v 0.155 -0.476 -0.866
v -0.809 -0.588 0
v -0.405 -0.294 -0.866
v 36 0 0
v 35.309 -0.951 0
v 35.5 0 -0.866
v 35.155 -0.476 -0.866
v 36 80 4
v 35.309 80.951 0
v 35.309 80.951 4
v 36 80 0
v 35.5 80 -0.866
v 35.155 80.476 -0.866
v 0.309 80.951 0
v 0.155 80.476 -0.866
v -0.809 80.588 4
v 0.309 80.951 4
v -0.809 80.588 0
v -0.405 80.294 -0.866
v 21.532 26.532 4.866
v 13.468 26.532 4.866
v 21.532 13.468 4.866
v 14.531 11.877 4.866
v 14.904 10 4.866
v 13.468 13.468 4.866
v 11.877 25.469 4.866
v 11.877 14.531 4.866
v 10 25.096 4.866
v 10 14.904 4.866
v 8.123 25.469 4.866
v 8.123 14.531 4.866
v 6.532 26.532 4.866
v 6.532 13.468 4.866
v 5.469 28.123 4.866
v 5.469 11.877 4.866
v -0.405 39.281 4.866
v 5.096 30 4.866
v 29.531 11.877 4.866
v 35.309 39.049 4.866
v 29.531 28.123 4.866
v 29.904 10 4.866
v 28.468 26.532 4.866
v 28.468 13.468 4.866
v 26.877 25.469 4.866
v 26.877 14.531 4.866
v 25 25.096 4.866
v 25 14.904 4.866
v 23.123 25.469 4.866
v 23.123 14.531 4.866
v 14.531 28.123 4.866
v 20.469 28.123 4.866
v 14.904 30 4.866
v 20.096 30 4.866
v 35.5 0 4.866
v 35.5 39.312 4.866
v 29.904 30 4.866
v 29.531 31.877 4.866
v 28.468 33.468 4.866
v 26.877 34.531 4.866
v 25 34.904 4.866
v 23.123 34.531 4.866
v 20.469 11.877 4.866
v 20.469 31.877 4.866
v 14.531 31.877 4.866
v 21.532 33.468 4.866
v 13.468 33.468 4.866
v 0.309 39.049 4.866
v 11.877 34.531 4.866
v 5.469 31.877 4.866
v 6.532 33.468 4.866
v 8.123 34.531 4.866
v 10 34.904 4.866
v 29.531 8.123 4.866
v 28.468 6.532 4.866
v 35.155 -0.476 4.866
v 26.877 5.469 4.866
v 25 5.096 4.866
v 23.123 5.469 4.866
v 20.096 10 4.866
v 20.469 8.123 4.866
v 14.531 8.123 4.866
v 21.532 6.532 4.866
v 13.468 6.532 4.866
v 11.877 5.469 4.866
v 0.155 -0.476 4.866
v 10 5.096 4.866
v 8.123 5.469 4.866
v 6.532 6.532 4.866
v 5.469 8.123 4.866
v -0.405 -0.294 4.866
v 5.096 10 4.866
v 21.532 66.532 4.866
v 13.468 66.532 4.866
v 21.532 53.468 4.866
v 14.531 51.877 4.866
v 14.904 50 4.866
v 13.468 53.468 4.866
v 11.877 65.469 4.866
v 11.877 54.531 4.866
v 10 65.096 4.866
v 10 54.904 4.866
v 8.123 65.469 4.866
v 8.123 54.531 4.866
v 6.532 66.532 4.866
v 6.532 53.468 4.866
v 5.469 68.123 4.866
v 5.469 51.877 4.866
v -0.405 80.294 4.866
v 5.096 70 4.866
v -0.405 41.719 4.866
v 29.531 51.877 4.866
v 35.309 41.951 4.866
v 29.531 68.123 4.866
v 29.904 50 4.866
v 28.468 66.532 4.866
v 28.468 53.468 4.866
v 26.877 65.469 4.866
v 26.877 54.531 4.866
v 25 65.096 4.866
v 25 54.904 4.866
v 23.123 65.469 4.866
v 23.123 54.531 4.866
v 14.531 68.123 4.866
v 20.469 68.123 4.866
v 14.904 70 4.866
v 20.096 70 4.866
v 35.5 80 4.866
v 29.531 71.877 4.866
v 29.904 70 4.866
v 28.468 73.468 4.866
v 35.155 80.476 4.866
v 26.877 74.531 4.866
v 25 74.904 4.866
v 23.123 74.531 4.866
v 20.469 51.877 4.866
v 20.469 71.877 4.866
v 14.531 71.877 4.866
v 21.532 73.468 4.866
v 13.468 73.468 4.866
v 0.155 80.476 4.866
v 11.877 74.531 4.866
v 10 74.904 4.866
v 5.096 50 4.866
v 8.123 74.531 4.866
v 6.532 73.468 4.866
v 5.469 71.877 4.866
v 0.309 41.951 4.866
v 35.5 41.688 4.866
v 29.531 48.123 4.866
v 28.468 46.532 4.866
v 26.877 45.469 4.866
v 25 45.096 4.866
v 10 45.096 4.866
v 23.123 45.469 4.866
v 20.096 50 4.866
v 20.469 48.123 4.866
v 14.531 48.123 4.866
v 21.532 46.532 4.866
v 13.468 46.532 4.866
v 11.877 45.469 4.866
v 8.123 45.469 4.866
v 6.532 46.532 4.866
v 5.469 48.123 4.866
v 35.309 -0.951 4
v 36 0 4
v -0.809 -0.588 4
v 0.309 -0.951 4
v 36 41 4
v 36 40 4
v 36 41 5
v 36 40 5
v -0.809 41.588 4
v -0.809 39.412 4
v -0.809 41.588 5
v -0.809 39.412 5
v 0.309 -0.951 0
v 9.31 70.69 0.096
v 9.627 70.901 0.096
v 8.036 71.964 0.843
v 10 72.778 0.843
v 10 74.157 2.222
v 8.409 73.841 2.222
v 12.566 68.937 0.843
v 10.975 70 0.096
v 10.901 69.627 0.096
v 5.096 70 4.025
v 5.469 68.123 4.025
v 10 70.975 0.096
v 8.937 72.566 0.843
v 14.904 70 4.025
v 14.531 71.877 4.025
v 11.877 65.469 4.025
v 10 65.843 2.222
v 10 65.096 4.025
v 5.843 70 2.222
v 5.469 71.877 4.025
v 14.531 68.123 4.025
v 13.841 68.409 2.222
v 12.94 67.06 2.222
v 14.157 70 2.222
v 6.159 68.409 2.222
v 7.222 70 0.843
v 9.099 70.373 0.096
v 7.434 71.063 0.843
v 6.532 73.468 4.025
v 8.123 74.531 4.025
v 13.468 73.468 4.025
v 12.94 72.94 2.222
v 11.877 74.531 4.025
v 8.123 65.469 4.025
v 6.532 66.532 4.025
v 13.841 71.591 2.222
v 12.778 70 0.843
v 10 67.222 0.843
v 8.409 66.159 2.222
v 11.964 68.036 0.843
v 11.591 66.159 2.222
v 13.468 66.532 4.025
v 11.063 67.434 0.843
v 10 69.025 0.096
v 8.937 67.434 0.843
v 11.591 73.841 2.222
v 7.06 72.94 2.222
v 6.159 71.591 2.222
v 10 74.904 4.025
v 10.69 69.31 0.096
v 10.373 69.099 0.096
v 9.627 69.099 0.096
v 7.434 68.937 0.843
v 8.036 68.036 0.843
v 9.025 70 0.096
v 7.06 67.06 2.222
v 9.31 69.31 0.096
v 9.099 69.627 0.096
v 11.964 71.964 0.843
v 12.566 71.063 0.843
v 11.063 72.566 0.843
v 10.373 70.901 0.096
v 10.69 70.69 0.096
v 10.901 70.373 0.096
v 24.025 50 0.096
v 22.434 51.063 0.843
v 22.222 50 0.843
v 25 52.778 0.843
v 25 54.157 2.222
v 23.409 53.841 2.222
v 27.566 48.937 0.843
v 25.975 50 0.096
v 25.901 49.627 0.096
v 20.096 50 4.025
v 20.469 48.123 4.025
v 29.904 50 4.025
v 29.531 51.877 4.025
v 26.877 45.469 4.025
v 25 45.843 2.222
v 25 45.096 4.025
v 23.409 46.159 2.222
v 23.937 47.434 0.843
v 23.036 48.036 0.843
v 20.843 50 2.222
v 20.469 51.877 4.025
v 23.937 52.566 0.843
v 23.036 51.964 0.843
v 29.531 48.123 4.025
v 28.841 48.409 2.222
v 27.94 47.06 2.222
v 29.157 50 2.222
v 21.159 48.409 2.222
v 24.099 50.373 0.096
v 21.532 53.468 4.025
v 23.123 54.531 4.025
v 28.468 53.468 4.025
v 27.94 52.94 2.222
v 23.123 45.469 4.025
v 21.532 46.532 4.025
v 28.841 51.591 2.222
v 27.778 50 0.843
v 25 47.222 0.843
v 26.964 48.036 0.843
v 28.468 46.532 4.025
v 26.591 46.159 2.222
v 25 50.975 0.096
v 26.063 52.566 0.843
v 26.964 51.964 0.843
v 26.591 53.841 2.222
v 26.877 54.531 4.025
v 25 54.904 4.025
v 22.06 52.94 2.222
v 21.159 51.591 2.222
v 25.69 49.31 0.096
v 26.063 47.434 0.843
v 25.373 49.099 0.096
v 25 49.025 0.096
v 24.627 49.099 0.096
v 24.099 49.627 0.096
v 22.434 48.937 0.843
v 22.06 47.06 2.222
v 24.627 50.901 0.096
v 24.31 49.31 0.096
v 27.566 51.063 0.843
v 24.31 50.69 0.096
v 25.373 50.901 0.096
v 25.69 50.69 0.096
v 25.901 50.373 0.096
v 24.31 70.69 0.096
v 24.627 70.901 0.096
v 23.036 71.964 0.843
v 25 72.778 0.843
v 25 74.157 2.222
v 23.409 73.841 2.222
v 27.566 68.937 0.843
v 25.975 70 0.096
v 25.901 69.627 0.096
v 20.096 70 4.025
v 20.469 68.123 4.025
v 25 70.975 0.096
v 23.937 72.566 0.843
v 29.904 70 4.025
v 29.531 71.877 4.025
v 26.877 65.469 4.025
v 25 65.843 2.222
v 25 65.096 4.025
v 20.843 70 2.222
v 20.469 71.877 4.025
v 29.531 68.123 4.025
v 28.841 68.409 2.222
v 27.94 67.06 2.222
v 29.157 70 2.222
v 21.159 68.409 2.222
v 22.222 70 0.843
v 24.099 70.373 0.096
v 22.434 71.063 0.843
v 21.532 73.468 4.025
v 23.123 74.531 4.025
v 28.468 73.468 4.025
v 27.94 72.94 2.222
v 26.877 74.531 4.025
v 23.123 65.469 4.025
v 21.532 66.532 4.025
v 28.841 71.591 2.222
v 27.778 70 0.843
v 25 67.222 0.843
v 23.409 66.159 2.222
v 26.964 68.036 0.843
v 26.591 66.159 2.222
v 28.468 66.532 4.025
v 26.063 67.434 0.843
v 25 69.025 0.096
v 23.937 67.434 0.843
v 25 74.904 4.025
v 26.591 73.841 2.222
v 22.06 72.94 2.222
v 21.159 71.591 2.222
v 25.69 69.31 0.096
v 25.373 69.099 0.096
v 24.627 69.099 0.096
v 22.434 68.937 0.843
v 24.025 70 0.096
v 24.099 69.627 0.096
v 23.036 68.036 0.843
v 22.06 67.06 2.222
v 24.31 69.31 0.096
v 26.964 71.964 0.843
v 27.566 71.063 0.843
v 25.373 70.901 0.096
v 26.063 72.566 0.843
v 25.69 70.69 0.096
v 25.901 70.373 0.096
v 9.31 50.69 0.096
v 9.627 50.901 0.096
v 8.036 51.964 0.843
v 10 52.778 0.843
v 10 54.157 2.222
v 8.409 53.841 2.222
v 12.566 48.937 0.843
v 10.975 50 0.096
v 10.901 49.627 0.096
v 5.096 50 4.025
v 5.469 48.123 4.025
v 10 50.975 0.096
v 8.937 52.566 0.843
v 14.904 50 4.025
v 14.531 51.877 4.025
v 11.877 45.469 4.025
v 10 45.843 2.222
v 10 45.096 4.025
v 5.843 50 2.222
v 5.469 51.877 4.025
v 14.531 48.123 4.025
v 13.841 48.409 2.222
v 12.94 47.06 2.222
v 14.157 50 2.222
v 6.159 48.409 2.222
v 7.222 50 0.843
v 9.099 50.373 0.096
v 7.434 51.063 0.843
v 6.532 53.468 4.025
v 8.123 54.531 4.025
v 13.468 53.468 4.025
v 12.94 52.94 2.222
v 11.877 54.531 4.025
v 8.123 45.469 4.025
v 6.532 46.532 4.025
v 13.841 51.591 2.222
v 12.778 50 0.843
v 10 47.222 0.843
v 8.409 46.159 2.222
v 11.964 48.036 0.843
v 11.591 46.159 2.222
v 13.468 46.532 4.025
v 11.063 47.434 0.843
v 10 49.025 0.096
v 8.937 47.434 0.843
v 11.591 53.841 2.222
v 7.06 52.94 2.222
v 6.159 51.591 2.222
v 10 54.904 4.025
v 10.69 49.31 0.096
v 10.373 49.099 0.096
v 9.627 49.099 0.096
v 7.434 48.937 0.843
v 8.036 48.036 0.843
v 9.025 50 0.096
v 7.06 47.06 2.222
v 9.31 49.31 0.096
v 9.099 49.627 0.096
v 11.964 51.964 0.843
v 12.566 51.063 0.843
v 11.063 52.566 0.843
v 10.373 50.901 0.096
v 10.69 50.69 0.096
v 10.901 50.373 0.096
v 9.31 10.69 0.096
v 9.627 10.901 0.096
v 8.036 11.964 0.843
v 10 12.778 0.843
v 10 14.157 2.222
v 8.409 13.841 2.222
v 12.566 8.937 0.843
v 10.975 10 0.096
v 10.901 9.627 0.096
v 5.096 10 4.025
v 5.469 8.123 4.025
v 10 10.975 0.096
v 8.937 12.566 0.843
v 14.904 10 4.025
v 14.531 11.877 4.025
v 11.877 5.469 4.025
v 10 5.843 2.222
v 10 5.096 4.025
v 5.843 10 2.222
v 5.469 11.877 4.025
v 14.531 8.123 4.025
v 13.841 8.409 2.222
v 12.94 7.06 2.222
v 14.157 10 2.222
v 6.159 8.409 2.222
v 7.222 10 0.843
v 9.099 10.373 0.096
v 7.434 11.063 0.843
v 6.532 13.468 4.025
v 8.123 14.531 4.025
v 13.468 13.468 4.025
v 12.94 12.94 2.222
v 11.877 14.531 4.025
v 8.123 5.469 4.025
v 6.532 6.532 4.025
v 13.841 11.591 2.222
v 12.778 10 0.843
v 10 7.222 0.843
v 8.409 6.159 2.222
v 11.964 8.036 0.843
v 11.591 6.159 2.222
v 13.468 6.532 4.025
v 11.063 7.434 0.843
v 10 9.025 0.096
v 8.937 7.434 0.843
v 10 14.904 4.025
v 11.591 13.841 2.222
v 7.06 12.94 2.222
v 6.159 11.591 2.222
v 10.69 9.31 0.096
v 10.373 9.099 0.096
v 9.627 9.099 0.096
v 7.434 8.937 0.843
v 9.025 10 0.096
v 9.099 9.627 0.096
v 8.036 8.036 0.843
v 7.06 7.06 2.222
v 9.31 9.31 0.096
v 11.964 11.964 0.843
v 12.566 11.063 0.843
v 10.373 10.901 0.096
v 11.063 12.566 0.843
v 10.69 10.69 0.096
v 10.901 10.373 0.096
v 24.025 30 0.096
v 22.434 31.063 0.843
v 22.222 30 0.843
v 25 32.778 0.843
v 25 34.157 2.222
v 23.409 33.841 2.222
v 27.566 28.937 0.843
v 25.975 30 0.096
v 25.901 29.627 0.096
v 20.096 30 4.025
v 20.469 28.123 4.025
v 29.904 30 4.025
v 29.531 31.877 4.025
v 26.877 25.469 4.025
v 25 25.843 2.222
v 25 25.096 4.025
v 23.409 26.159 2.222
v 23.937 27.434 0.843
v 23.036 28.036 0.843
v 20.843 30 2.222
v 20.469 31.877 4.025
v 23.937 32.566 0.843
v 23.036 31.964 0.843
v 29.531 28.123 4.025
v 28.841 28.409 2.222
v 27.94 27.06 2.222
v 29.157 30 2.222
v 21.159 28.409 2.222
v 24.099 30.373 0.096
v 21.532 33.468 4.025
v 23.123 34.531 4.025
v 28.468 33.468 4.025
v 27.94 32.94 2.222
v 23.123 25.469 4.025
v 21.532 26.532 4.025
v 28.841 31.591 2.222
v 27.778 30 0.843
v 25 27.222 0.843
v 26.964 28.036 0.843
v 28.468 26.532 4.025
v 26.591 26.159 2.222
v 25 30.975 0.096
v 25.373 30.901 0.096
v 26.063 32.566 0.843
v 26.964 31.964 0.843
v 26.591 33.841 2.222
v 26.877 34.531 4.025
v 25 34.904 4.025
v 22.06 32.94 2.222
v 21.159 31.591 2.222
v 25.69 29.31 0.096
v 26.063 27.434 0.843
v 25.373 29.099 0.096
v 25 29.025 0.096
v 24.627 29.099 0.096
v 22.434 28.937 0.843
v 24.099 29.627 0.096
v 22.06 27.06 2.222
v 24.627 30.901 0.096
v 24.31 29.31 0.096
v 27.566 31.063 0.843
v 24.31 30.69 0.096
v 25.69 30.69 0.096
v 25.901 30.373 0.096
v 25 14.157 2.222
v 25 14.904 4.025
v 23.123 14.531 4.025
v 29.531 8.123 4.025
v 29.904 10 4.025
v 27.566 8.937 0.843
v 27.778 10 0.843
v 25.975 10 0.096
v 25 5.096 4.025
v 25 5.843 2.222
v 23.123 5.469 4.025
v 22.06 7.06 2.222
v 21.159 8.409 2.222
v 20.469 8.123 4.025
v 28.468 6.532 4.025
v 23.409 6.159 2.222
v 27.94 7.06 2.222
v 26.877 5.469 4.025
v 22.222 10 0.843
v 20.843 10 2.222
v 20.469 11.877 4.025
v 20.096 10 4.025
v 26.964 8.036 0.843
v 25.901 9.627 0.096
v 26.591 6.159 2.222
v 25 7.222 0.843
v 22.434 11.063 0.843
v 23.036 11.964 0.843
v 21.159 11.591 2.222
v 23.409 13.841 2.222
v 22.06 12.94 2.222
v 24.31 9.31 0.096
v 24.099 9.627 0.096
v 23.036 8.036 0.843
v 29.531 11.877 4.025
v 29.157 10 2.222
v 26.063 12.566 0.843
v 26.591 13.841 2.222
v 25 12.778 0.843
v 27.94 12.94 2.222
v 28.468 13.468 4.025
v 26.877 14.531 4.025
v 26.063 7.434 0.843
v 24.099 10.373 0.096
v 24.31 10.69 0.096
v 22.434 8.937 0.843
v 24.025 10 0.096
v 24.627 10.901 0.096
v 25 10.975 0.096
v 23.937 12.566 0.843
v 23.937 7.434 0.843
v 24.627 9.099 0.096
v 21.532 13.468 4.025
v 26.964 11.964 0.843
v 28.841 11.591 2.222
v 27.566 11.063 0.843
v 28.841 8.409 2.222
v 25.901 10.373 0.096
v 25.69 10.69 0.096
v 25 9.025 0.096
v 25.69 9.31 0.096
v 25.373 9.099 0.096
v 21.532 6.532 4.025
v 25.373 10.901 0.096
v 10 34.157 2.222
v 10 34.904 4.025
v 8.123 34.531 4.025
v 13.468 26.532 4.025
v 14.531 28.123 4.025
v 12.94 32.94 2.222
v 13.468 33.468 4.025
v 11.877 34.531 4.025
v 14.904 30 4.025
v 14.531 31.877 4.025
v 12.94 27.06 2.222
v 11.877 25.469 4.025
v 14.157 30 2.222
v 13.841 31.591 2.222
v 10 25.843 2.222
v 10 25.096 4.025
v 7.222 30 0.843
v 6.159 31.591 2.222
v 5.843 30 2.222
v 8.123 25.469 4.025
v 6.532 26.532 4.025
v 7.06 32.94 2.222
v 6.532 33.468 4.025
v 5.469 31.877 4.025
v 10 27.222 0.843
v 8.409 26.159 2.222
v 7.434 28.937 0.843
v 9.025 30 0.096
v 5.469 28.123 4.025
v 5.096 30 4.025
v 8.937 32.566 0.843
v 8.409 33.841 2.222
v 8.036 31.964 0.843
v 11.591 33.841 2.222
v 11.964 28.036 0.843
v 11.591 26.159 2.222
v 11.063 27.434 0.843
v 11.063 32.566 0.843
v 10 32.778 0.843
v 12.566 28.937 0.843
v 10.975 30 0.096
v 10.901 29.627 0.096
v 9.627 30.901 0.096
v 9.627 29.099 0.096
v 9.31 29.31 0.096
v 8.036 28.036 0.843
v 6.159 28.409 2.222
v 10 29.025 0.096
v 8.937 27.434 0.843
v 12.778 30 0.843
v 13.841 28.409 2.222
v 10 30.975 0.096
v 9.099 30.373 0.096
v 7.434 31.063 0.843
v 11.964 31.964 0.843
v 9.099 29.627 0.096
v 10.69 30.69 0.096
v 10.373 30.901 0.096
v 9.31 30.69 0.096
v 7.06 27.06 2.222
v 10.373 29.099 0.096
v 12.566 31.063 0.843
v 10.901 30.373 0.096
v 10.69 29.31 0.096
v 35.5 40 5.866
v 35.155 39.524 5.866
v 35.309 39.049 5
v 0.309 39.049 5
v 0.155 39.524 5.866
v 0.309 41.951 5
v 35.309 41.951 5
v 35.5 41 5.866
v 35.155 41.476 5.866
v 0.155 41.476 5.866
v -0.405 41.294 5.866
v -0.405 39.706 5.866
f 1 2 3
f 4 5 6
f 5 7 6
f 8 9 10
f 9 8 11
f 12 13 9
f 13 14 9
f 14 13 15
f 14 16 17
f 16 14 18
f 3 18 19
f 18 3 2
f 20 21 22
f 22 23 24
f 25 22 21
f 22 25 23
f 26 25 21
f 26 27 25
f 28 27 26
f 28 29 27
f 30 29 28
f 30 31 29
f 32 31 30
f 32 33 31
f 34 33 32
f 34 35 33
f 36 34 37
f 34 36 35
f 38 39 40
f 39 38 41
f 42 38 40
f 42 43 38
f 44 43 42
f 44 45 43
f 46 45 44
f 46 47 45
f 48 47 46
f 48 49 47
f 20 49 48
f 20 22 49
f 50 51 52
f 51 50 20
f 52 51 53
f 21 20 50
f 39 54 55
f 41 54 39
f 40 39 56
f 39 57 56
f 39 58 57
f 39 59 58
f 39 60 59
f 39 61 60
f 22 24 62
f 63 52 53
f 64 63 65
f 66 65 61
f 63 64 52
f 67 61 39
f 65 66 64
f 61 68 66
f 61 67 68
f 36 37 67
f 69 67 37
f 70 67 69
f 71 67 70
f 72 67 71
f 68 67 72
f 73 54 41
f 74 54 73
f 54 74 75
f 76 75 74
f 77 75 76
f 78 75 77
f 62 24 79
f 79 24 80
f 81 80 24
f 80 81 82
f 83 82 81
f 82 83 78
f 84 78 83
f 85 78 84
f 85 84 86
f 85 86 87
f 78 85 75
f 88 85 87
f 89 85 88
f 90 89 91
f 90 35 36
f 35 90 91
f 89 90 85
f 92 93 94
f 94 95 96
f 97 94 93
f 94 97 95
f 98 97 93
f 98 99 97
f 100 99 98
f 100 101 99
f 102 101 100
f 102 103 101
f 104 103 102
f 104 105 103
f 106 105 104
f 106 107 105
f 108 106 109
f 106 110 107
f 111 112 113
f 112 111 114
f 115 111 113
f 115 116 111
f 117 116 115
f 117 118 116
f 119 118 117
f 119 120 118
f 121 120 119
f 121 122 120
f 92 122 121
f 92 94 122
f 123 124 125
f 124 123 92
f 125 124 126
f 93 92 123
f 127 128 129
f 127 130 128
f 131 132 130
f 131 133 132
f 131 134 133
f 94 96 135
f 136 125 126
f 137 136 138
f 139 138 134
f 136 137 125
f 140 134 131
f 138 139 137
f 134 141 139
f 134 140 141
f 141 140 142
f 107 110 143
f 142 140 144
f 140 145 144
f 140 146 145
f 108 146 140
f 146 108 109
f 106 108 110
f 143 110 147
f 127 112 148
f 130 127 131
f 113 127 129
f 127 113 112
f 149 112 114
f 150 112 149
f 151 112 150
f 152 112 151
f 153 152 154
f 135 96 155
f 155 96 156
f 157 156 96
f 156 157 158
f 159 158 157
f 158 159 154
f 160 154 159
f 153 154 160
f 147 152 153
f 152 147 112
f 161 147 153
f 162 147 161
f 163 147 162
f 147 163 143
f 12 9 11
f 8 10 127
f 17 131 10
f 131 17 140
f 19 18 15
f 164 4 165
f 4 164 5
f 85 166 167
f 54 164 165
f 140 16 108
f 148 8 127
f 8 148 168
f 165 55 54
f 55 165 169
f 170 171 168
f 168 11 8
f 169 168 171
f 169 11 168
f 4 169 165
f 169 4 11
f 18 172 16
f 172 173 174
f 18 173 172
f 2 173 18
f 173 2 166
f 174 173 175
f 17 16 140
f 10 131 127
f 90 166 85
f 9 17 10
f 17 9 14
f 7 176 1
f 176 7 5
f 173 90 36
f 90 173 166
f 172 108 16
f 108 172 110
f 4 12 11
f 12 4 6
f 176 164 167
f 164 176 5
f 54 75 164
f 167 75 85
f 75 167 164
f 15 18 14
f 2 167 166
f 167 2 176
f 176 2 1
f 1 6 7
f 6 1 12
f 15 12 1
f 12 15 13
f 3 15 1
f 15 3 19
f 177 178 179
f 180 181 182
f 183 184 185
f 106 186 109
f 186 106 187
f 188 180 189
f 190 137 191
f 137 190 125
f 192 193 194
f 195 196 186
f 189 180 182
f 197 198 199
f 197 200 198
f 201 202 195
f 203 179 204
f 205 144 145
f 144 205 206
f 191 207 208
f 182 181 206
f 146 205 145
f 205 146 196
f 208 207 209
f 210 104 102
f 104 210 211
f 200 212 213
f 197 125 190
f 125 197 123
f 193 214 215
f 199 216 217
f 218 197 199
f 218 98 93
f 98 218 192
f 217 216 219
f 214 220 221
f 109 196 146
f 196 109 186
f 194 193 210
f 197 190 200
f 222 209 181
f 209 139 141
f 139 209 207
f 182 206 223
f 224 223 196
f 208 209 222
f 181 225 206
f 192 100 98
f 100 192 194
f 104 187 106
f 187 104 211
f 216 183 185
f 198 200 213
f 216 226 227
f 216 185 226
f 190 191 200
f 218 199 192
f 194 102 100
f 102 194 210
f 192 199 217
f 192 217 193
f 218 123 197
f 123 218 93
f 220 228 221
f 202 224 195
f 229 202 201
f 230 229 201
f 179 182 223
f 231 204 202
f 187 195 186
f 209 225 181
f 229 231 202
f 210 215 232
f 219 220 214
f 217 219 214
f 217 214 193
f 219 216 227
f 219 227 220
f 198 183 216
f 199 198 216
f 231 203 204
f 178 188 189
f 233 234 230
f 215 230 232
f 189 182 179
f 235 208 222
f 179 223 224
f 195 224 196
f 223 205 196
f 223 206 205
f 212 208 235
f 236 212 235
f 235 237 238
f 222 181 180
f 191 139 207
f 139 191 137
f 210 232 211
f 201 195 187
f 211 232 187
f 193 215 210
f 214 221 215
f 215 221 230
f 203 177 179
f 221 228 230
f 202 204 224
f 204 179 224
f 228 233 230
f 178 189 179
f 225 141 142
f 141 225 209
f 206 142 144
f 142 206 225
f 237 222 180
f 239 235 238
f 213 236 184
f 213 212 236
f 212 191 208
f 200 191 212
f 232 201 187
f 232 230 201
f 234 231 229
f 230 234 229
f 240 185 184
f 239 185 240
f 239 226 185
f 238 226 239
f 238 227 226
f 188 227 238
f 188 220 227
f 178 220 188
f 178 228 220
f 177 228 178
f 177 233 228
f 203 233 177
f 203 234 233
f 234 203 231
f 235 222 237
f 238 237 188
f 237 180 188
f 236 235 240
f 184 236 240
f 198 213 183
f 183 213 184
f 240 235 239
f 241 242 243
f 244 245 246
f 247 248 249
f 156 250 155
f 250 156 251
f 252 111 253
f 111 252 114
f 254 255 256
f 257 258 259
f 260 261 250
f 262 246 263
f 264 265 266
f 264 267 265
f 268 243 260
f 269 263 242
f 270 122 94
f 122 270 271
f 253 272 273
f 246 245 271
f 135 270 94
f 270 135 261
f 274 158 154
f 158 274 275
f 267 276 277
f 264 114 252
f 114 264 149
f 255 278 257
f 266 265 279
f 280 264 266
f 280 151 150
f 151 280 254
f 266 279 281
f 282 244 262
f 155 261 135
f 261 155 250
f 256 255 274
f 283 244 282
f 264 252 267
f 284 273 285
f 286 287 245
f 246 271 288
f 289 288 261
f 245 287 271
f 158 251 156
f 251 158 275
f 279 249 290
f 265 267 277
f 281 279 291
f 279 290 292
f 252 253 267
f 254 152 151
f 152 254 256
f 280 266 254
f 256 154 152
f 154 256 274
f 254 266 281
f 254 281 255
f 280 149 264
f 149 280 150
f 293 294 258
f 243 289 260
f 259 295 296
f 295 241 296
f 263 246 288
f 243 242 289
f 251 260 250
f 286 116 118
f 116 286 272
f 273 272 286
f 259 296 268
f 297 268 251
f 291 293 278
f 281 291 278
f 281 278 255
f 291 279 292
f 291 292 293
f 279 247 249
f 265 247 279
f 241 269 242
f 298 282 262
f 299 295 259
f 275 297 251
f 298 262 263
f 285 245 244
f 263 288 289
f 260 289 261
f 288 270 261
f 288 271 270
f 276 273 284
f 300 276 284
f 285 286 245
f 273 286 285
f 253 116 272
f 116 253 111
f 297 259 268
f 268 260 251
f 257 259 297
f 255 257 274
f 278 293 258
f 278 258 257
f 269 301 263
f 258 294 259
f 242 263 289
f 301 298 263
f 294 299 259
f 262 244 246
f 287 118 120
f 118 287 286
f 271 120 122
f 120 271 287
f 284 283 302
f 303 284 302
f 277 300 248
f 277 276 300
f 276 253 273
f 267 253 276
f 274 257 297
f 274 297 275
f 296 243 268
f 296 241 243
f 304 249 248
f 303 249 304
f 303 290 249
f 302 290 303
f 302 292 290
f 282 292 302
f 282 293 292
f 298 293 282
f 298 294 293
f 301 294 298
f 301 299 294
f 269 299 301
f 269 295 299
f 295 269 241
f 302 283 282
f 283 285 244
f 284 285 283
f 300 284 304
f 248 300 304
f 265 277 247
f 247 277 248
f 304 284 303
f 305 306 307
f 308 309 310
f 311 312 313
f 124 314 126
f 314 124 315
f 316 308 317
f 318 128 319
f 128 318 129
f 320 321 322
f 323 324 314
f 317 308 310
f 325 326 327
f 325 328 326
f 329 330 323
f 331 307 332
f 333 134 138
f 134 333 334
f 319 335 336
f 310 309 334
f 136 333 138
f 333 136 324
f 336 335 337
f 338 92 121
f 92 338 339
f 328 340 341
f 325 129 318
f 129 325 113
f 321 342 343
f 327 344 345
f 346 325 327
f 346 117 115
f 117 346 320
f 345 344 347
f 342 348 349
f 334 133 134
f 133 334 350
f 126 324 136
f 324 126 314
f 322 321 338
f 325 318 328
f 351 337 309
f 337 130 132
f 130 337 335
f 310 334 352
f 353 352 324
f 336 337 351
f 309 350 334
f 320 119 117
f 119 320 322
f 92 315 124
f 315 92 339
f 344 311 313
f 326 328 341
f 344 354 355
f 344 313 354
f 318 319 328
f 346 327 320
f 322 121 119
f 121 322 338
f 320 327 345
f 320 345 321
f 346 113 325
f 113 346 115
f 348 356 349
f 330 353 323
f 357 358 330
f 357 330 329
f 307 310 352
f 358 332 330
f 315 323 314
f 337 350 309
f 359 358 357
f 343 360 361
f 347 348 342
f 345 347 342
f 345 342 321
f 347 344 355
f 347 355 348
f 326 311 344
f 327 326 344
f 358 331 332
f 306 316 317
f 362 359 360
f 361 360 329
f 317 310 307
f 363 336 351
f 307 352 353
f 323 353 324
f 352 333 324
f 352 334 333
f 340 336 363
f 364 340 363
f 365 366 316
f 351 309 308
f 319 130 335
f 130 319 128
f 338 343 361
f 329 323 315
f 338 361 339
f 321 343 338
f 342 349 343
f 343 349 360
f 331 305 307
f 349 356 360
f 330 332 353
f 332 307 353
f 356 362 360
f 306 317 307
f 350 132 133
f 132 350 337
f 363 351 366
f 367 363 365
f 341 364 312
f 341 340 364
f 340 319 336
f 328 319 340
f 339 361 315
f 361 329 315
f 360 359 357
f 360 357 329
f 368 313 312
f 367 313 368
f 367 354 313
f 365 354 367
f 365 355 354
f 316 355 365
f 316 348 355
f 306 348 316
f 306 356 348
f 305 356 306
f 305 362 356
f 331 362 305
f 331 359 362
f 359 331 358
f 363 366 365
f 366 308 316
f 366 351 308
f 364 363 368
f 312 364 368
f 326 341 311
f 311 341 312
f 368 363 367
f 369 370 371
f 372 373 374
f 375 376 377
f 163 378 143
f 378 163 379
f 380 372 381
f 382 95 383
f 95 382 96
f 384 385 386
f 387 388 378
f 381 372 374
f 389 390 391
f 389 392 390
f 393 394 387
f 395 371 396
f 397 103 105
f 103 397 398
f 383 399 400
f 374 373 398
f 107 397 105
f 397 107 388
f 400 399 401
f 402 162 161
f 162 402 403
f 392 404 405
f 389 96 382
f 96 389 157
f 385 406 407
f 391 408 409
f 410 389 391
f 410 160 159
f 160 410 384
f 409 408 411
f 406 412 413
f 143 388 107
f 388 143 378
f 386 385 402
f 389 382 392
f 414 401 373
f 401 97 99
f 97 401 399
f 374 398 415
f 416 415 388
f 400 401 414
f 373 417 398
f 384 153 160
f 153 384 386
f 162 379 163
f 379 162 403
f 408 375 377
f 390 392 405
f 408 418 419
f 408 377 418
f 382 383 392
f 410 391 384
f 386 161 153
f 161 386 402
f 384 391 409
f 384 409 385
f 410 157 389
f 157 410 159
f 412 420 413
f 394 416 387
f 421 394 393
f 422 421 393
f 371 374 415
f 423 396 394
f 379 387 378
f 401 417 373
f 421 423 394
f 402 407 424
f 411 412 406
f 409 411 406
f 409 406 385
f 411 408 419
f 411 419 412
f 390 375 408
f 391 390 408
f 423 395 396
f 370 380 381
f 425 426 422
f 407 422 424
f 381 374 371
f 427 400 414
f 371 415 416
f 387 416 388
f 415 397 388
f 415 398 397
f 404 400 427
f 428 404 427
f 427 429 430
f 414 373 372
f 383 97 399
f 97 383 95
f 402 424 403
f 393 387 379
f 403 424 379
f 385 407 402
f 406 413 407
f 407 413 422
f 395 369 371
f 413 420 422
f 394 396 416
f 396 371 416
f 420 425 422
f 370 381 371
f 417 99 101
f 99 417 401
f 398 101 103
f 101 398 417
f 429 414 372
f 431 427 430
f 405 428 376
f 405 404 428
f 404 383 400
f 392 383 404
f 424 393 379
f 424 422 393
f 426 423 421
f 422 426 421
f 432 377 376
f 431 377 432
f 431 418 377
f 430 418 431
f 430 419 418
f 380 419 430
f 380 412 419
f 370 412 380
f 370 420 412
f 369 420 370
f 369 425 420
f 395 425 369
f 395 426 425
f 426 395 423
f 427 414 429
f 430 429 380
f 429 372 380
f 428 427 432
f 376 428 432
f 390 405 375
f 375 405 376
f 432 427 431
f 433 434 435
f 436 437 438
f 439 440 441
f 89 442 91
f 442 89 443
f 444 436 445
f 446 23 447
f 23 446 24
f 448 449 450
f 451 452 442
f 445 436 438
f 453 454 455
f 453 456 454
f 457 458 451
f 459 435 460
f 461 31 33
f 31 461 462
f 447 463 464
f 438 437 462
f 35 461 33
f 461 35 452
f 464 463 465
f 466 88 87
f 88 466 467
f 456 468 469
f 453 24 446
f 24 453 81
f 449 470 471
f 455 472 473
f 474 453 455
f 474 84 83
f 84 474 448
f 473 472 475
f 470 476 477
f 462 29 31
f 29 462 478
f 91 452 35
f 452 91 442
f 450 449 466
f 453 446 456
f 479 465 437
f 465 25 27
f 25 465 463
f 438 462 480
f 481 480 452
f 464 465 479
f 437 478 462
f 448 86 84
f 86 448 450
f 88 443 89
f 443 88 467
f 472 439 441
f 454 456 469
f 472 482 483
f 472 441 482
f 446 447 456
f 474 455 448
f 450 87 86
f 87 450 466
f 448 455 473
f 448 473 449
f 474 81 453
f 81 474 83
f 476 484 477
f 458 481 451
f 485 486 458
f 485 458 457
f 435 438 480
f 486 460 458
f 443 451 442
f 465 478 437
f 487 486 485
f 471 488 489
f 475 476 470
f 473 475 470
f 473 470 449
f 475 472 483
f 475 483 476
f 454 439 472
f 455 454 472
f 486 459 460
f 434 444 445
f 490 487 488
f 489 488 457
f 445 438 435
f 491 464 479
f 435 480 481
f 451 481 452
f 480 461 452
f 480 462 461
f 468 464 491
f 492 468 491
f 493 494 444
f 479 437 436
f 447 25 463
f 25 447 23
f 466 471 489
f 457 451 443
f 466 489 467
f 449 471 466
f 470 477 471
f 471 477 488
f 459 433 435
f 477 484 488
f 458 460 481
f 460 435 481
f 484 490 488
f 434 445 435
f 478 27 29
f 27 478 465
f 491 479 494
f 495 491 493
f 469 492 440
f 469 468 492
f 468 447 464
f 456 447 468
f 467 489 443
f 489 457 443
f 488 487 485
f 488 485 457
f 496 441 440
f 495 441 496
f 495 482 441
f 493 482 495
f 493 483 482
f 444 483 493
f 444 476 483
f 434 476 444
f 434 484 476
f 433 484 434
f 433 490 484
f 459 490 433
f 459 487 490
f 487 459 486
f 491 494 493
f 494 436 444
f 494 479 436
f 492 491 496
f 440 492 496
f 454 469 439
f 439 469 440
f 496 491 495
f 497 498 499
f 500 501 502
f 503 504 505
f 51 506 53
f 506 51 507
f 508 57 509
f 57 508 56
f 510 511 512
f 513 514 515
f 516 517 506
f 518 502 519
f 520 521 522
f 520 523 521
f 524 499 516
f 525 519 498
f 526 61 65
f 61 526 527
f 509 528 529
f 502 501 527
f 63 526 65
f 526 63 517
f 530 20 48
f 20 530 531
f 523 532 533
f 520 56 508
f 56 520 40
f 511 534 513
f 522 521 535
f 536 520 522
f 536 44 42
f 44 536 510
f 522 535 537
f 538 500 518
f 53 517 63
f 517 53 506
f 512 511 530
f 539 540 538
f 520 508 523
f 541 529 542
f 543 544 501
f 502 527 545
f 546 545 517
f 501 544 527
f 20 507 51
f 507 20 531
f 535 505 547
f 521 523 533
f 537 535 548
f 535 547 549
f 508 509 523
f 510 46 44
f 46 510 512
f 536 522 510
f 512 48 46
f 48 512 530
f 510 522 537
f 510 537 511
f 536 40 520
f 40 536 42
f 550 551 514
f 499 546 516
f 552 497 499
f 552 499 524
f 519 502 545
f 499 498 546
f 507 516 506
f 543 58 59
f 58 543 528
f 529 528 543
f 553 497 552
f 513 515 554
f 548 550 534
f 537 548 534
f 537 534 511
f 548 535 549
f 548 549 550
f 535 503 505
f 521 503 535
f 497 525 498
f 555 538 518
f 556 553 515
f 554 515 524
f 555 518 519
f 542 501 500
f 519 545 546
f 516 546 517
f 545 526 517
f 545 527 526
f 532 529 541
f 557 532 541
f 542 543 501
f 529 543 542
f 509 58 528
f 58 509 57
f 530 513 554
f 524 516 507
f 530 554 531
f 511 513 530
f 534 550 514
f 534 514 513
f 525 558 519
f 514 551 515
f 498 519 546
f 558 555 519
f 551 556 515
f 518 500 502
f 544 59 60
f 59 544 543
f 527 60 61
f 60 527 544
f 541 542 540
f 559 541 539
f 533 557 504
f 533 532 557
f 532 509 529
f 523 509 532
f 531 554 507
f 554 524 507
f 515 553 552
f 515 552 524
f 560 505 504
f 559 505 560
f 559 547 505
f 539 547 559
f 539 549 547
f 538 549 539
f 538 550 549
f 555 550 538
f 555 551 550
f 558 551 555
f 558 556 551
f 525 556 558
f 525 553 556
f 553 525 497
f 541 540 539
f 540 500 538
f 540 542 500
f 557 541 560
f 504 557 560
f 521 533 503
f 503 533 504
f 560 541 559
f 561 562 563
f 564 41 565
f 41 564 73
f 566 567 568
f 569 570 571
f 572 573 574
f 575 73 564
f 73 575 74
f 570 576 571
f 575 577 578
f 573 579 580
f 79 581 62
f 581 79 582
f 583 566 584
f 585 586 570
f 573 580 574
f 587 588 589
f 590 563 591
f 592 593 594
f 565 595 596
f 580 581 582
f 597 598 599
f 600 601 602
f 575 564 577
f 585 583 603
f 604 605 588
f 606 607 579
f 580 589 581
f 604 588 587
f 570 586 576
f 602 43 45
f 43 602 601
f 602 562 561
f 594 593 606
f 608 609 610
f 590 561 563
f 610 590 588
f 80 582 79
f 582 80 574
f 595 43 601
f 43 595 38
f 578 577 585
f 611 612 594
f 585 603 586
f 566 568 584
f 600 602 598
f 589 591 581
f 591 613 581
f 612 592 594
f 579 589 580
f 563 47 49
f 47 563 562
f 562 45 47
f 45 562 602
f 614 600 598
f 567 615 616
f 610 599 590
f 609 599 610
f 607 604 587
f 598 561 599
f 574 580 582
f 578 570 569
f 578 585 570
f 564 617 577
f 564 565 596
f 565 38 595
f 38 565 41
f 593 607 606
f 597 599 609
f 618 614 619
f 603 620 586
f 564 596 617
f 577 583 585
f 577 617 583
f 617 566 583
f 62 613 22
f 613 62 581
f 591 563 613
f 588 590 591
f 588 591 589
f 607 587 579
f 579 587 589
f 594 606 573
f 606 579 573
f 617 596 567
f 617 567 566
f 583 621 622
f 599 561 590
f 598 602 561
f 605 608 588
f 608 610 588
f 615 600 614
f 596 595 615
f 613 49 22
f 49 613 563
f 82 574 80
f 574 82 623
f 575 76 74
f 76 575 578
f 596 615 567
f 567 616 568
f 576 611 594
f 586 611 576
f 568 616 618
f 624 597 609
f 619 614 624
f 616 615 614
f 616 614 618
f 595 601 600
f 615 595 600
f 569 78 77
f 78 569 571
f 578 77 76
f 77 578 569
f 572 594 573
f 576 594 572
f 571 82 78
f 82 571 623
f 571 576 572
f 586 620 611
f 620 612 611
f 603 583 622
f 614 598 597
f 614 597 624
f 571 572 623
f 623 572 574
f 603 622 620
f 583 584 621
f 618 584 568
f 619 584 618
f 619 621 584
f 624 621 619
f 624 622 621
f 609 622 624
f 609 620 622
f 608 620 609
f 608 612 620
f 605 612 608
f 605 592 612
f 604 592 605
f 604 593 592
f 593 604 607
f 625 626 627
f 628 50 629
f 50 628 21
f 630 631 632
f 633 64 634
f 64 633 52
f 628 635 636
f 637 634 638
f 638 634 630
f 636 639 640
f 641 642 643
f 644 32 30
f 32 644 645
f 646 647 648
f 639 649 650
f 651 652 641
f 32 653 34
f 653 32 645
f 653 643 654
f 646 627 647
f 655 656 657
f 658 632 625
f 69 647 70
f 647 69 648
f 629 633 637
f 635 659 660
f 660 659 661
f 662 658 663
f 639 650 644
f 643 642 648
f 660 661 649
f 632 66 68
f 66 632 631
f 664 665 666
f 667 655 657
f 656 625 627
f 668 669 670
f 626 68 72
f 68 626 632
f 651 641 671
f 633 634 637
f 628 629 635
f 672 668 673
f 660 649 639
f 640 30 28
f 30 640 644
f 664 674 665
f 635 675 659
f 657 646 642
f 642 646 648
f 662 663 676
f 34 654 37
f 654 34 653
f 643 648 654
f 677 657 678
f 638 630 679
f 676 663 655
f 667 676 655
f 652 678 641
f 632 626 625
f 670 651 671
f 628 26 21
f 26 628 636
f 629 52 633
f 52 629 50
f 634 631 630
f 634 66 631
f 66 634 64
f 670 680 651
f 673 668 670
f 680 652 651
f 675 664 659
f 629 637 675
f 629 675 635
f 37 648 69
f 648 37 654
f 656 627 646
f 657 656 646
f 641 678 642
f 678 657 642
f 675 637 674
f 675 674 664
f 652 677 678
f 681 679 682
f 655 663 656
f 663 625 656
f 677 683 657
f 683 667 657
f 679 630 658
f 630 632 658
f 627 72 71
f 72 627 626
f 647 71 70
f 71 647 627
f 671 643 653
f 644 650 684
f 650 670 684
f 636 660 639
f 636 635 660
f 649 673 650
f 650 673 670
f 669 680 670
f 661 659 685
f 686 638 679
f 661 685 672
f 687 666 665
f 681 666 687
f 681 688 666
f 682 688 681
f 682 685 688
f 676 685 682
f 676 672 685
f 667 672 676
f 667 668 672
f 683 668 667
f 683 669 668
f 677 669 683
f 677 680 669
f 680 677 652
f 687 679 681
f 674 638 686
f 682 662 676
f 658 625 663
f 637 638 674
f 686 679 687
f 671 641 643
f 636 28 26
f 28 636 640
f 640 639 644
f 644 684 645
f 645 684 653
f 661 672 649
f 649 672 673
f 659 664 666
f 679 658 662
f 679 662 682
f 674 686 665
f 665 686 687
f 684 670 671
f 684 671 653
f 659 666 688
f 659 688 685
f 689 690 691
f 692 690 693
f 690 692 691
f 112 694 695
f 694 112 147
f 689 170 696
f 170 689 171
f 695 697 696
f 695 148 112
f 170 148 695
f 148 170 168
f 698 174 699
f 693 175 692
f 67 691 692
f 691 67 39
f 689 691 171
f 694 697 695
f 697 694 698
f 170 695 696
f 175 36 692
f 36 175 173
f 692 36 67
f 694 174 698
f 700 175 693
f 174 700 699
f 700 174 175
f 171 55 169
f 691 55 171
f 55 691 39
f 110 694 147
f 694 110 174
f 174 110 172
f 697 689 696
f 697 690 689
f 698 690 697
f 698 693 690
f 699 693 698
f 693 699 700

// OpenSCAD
// Loguncov Maxim 13.12.13

//$fn=128;


translate([0,40,0])
minkowski()
{cube([35,1,5]);
sphere(1);
}

difference() {

//основа
minkowski()
{cube([35,80,4]);
sphere(1);
}

//отверстия
translate([10,70,5])sphere(5);
translate([25,50,5])sphere(5);
translate([25,70,5])sphere(5);
translate([10,50,5])sphere(5);


translate([10,10,5])sphere(5);
translate([25,30,5])sphere(5);
translate([25,10,5])sphere(5);
translate([10,30,5])sphere(5);

}
